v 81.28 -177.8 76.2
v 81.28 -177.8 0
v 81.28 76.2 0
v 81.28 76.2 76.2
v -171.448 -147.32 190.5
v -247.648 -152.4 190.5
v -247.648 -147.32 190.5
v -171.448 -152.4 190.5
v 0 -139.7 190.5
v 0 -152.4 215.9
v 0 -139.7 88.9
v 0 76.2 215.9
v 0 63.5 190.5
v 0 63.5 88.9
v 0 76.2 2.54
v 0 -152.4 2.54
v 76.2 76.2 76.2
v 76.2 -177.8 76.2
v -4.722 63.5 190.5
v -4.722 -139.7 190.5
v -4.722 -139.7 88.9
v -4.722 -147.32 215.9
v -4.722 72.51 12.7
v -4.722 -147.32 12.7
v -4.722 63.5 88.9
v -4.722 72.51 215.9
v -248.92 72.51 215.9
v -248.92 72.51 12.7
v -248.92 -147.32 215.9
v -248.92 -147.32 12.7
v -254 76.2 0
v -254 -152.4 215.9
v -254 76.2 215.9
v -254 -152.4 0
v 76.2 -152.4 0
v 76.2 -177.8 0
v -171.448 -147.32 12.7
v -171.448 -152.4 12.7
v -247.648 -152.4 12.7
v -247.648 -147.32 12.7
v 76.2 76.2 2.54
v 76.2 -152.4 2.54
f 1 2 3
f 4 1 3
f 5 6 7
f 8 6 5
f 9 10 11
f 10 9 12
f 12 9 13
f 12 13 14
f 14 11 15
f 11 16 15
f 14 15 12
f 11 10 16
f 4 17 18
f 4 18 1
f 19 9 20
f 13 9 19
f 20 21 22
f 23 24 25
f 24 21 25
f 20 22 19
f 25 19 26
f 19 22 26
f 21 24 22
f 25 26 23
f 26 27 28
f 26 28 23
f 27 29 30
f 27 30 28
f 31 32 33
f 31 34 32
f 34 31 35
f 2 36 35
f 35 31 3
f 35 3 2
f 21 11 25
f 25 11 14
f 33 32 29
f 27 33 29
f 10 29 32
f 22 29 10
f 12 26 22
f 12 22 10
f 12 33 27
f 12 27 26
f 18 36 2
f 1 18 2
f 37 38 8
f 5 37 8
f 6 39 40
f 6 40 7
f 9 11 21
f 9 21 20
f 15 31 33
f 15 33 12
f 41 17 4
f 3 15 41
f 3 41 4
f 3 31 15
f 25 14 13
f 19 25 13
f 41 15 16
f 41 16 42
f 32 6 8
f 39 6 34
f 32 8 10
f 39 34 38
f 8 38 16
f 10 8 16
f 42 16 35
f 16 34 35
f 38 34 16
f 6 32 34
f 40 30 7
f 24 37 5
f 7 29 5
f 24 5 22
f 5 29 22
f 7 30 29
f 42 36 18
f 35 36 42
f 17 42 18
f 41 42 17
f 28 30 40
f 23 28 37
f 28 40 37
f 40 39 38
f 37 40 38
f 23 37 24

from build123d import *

# Parameters (mm, degrees)
F0_W      = 5.08
F0_H      = 254
F1_DEPTH  = 76.2
F2_W      = 76.2
F2_H      = 228.6
F3_DEPTH  = 2.54
F4_W      = 254
F4_H      = 228.6
F5_DEPTH  = 12.7
F6_W      = 254
F6_H      = 228.6
F7_DEPTH  = 203.2
F8_W      = 244.1982476321
F8_H      = 219.8302176212
F9_DEPTH  = 203.2
F10_W     = 203.2
F10_H     = 101.6
F11_DEPTH = 25.4
F12_W     = 76.2
F12_H     = 177.8
F13_DEPTH = 25.4


with BuildPart() as f1:
    # F0 (on Top) → F1 (new body)
    with BuildSketch(Plane.XY):
        with Locations((78.74, -50.8)):
            Rectangle(F0_W, F0_H)
    extrude(amount=F1_DEPTH)

    # F2 (on Top) → F3 (join)
    with BuildSketch(Plane.XY):
        with Locations((38.1, -38.1)):
            Rectangle(F2_W, F2_H)
    extrude(amount=F3_DEPTH)

    # F4 (on Top) → F5 (join)
    with BuildSketch(Plane.XY):
        with Locations((-127, -38.1)):
            Rectangle(F4_W, F4_H)
    extrude(amount=F5_DEPTH)

    # F6 (on face) → F7 (join)
    with BuildSketch(Plane.XY.offset(12.7)):
        with Locations((-127, -38.1)):
            Rectangle(F6_W, F6_H)
    extrude(amount=F7_DEPTH)

    # F8 (on face) → F9 (cut)
    with BuildSketch(Plane.XY.offset(215.9)):
        with Locations((-126.820876184, -37.4048911894)):
            Rectangle(F8_W, F8_H)
    extrude(amount=-F9_DEPTH, mode=Mode.SUBTRACT)

    # F10 (on face) → F11 (cut)
    with BuildSketch(Plane.YZ):
        with Locations((-38.1, 139.7)):
            Rectangle(F10_W, F10_H)
    extrude(amount=-F11_DEPTH, mode=Mode.SUBTRACT)

    # F12 (on face) → F13 (cut)
    with BuildSketch(Plane.XZ.offset(152.4)):
        with Locations((-209.5483732462, 101.6)):
            Rectangle(F12_W, F12_H)
    extrude(amount=-F13_DEPTH, mode=Mode.SUBTRACT)


solid = f1.part
